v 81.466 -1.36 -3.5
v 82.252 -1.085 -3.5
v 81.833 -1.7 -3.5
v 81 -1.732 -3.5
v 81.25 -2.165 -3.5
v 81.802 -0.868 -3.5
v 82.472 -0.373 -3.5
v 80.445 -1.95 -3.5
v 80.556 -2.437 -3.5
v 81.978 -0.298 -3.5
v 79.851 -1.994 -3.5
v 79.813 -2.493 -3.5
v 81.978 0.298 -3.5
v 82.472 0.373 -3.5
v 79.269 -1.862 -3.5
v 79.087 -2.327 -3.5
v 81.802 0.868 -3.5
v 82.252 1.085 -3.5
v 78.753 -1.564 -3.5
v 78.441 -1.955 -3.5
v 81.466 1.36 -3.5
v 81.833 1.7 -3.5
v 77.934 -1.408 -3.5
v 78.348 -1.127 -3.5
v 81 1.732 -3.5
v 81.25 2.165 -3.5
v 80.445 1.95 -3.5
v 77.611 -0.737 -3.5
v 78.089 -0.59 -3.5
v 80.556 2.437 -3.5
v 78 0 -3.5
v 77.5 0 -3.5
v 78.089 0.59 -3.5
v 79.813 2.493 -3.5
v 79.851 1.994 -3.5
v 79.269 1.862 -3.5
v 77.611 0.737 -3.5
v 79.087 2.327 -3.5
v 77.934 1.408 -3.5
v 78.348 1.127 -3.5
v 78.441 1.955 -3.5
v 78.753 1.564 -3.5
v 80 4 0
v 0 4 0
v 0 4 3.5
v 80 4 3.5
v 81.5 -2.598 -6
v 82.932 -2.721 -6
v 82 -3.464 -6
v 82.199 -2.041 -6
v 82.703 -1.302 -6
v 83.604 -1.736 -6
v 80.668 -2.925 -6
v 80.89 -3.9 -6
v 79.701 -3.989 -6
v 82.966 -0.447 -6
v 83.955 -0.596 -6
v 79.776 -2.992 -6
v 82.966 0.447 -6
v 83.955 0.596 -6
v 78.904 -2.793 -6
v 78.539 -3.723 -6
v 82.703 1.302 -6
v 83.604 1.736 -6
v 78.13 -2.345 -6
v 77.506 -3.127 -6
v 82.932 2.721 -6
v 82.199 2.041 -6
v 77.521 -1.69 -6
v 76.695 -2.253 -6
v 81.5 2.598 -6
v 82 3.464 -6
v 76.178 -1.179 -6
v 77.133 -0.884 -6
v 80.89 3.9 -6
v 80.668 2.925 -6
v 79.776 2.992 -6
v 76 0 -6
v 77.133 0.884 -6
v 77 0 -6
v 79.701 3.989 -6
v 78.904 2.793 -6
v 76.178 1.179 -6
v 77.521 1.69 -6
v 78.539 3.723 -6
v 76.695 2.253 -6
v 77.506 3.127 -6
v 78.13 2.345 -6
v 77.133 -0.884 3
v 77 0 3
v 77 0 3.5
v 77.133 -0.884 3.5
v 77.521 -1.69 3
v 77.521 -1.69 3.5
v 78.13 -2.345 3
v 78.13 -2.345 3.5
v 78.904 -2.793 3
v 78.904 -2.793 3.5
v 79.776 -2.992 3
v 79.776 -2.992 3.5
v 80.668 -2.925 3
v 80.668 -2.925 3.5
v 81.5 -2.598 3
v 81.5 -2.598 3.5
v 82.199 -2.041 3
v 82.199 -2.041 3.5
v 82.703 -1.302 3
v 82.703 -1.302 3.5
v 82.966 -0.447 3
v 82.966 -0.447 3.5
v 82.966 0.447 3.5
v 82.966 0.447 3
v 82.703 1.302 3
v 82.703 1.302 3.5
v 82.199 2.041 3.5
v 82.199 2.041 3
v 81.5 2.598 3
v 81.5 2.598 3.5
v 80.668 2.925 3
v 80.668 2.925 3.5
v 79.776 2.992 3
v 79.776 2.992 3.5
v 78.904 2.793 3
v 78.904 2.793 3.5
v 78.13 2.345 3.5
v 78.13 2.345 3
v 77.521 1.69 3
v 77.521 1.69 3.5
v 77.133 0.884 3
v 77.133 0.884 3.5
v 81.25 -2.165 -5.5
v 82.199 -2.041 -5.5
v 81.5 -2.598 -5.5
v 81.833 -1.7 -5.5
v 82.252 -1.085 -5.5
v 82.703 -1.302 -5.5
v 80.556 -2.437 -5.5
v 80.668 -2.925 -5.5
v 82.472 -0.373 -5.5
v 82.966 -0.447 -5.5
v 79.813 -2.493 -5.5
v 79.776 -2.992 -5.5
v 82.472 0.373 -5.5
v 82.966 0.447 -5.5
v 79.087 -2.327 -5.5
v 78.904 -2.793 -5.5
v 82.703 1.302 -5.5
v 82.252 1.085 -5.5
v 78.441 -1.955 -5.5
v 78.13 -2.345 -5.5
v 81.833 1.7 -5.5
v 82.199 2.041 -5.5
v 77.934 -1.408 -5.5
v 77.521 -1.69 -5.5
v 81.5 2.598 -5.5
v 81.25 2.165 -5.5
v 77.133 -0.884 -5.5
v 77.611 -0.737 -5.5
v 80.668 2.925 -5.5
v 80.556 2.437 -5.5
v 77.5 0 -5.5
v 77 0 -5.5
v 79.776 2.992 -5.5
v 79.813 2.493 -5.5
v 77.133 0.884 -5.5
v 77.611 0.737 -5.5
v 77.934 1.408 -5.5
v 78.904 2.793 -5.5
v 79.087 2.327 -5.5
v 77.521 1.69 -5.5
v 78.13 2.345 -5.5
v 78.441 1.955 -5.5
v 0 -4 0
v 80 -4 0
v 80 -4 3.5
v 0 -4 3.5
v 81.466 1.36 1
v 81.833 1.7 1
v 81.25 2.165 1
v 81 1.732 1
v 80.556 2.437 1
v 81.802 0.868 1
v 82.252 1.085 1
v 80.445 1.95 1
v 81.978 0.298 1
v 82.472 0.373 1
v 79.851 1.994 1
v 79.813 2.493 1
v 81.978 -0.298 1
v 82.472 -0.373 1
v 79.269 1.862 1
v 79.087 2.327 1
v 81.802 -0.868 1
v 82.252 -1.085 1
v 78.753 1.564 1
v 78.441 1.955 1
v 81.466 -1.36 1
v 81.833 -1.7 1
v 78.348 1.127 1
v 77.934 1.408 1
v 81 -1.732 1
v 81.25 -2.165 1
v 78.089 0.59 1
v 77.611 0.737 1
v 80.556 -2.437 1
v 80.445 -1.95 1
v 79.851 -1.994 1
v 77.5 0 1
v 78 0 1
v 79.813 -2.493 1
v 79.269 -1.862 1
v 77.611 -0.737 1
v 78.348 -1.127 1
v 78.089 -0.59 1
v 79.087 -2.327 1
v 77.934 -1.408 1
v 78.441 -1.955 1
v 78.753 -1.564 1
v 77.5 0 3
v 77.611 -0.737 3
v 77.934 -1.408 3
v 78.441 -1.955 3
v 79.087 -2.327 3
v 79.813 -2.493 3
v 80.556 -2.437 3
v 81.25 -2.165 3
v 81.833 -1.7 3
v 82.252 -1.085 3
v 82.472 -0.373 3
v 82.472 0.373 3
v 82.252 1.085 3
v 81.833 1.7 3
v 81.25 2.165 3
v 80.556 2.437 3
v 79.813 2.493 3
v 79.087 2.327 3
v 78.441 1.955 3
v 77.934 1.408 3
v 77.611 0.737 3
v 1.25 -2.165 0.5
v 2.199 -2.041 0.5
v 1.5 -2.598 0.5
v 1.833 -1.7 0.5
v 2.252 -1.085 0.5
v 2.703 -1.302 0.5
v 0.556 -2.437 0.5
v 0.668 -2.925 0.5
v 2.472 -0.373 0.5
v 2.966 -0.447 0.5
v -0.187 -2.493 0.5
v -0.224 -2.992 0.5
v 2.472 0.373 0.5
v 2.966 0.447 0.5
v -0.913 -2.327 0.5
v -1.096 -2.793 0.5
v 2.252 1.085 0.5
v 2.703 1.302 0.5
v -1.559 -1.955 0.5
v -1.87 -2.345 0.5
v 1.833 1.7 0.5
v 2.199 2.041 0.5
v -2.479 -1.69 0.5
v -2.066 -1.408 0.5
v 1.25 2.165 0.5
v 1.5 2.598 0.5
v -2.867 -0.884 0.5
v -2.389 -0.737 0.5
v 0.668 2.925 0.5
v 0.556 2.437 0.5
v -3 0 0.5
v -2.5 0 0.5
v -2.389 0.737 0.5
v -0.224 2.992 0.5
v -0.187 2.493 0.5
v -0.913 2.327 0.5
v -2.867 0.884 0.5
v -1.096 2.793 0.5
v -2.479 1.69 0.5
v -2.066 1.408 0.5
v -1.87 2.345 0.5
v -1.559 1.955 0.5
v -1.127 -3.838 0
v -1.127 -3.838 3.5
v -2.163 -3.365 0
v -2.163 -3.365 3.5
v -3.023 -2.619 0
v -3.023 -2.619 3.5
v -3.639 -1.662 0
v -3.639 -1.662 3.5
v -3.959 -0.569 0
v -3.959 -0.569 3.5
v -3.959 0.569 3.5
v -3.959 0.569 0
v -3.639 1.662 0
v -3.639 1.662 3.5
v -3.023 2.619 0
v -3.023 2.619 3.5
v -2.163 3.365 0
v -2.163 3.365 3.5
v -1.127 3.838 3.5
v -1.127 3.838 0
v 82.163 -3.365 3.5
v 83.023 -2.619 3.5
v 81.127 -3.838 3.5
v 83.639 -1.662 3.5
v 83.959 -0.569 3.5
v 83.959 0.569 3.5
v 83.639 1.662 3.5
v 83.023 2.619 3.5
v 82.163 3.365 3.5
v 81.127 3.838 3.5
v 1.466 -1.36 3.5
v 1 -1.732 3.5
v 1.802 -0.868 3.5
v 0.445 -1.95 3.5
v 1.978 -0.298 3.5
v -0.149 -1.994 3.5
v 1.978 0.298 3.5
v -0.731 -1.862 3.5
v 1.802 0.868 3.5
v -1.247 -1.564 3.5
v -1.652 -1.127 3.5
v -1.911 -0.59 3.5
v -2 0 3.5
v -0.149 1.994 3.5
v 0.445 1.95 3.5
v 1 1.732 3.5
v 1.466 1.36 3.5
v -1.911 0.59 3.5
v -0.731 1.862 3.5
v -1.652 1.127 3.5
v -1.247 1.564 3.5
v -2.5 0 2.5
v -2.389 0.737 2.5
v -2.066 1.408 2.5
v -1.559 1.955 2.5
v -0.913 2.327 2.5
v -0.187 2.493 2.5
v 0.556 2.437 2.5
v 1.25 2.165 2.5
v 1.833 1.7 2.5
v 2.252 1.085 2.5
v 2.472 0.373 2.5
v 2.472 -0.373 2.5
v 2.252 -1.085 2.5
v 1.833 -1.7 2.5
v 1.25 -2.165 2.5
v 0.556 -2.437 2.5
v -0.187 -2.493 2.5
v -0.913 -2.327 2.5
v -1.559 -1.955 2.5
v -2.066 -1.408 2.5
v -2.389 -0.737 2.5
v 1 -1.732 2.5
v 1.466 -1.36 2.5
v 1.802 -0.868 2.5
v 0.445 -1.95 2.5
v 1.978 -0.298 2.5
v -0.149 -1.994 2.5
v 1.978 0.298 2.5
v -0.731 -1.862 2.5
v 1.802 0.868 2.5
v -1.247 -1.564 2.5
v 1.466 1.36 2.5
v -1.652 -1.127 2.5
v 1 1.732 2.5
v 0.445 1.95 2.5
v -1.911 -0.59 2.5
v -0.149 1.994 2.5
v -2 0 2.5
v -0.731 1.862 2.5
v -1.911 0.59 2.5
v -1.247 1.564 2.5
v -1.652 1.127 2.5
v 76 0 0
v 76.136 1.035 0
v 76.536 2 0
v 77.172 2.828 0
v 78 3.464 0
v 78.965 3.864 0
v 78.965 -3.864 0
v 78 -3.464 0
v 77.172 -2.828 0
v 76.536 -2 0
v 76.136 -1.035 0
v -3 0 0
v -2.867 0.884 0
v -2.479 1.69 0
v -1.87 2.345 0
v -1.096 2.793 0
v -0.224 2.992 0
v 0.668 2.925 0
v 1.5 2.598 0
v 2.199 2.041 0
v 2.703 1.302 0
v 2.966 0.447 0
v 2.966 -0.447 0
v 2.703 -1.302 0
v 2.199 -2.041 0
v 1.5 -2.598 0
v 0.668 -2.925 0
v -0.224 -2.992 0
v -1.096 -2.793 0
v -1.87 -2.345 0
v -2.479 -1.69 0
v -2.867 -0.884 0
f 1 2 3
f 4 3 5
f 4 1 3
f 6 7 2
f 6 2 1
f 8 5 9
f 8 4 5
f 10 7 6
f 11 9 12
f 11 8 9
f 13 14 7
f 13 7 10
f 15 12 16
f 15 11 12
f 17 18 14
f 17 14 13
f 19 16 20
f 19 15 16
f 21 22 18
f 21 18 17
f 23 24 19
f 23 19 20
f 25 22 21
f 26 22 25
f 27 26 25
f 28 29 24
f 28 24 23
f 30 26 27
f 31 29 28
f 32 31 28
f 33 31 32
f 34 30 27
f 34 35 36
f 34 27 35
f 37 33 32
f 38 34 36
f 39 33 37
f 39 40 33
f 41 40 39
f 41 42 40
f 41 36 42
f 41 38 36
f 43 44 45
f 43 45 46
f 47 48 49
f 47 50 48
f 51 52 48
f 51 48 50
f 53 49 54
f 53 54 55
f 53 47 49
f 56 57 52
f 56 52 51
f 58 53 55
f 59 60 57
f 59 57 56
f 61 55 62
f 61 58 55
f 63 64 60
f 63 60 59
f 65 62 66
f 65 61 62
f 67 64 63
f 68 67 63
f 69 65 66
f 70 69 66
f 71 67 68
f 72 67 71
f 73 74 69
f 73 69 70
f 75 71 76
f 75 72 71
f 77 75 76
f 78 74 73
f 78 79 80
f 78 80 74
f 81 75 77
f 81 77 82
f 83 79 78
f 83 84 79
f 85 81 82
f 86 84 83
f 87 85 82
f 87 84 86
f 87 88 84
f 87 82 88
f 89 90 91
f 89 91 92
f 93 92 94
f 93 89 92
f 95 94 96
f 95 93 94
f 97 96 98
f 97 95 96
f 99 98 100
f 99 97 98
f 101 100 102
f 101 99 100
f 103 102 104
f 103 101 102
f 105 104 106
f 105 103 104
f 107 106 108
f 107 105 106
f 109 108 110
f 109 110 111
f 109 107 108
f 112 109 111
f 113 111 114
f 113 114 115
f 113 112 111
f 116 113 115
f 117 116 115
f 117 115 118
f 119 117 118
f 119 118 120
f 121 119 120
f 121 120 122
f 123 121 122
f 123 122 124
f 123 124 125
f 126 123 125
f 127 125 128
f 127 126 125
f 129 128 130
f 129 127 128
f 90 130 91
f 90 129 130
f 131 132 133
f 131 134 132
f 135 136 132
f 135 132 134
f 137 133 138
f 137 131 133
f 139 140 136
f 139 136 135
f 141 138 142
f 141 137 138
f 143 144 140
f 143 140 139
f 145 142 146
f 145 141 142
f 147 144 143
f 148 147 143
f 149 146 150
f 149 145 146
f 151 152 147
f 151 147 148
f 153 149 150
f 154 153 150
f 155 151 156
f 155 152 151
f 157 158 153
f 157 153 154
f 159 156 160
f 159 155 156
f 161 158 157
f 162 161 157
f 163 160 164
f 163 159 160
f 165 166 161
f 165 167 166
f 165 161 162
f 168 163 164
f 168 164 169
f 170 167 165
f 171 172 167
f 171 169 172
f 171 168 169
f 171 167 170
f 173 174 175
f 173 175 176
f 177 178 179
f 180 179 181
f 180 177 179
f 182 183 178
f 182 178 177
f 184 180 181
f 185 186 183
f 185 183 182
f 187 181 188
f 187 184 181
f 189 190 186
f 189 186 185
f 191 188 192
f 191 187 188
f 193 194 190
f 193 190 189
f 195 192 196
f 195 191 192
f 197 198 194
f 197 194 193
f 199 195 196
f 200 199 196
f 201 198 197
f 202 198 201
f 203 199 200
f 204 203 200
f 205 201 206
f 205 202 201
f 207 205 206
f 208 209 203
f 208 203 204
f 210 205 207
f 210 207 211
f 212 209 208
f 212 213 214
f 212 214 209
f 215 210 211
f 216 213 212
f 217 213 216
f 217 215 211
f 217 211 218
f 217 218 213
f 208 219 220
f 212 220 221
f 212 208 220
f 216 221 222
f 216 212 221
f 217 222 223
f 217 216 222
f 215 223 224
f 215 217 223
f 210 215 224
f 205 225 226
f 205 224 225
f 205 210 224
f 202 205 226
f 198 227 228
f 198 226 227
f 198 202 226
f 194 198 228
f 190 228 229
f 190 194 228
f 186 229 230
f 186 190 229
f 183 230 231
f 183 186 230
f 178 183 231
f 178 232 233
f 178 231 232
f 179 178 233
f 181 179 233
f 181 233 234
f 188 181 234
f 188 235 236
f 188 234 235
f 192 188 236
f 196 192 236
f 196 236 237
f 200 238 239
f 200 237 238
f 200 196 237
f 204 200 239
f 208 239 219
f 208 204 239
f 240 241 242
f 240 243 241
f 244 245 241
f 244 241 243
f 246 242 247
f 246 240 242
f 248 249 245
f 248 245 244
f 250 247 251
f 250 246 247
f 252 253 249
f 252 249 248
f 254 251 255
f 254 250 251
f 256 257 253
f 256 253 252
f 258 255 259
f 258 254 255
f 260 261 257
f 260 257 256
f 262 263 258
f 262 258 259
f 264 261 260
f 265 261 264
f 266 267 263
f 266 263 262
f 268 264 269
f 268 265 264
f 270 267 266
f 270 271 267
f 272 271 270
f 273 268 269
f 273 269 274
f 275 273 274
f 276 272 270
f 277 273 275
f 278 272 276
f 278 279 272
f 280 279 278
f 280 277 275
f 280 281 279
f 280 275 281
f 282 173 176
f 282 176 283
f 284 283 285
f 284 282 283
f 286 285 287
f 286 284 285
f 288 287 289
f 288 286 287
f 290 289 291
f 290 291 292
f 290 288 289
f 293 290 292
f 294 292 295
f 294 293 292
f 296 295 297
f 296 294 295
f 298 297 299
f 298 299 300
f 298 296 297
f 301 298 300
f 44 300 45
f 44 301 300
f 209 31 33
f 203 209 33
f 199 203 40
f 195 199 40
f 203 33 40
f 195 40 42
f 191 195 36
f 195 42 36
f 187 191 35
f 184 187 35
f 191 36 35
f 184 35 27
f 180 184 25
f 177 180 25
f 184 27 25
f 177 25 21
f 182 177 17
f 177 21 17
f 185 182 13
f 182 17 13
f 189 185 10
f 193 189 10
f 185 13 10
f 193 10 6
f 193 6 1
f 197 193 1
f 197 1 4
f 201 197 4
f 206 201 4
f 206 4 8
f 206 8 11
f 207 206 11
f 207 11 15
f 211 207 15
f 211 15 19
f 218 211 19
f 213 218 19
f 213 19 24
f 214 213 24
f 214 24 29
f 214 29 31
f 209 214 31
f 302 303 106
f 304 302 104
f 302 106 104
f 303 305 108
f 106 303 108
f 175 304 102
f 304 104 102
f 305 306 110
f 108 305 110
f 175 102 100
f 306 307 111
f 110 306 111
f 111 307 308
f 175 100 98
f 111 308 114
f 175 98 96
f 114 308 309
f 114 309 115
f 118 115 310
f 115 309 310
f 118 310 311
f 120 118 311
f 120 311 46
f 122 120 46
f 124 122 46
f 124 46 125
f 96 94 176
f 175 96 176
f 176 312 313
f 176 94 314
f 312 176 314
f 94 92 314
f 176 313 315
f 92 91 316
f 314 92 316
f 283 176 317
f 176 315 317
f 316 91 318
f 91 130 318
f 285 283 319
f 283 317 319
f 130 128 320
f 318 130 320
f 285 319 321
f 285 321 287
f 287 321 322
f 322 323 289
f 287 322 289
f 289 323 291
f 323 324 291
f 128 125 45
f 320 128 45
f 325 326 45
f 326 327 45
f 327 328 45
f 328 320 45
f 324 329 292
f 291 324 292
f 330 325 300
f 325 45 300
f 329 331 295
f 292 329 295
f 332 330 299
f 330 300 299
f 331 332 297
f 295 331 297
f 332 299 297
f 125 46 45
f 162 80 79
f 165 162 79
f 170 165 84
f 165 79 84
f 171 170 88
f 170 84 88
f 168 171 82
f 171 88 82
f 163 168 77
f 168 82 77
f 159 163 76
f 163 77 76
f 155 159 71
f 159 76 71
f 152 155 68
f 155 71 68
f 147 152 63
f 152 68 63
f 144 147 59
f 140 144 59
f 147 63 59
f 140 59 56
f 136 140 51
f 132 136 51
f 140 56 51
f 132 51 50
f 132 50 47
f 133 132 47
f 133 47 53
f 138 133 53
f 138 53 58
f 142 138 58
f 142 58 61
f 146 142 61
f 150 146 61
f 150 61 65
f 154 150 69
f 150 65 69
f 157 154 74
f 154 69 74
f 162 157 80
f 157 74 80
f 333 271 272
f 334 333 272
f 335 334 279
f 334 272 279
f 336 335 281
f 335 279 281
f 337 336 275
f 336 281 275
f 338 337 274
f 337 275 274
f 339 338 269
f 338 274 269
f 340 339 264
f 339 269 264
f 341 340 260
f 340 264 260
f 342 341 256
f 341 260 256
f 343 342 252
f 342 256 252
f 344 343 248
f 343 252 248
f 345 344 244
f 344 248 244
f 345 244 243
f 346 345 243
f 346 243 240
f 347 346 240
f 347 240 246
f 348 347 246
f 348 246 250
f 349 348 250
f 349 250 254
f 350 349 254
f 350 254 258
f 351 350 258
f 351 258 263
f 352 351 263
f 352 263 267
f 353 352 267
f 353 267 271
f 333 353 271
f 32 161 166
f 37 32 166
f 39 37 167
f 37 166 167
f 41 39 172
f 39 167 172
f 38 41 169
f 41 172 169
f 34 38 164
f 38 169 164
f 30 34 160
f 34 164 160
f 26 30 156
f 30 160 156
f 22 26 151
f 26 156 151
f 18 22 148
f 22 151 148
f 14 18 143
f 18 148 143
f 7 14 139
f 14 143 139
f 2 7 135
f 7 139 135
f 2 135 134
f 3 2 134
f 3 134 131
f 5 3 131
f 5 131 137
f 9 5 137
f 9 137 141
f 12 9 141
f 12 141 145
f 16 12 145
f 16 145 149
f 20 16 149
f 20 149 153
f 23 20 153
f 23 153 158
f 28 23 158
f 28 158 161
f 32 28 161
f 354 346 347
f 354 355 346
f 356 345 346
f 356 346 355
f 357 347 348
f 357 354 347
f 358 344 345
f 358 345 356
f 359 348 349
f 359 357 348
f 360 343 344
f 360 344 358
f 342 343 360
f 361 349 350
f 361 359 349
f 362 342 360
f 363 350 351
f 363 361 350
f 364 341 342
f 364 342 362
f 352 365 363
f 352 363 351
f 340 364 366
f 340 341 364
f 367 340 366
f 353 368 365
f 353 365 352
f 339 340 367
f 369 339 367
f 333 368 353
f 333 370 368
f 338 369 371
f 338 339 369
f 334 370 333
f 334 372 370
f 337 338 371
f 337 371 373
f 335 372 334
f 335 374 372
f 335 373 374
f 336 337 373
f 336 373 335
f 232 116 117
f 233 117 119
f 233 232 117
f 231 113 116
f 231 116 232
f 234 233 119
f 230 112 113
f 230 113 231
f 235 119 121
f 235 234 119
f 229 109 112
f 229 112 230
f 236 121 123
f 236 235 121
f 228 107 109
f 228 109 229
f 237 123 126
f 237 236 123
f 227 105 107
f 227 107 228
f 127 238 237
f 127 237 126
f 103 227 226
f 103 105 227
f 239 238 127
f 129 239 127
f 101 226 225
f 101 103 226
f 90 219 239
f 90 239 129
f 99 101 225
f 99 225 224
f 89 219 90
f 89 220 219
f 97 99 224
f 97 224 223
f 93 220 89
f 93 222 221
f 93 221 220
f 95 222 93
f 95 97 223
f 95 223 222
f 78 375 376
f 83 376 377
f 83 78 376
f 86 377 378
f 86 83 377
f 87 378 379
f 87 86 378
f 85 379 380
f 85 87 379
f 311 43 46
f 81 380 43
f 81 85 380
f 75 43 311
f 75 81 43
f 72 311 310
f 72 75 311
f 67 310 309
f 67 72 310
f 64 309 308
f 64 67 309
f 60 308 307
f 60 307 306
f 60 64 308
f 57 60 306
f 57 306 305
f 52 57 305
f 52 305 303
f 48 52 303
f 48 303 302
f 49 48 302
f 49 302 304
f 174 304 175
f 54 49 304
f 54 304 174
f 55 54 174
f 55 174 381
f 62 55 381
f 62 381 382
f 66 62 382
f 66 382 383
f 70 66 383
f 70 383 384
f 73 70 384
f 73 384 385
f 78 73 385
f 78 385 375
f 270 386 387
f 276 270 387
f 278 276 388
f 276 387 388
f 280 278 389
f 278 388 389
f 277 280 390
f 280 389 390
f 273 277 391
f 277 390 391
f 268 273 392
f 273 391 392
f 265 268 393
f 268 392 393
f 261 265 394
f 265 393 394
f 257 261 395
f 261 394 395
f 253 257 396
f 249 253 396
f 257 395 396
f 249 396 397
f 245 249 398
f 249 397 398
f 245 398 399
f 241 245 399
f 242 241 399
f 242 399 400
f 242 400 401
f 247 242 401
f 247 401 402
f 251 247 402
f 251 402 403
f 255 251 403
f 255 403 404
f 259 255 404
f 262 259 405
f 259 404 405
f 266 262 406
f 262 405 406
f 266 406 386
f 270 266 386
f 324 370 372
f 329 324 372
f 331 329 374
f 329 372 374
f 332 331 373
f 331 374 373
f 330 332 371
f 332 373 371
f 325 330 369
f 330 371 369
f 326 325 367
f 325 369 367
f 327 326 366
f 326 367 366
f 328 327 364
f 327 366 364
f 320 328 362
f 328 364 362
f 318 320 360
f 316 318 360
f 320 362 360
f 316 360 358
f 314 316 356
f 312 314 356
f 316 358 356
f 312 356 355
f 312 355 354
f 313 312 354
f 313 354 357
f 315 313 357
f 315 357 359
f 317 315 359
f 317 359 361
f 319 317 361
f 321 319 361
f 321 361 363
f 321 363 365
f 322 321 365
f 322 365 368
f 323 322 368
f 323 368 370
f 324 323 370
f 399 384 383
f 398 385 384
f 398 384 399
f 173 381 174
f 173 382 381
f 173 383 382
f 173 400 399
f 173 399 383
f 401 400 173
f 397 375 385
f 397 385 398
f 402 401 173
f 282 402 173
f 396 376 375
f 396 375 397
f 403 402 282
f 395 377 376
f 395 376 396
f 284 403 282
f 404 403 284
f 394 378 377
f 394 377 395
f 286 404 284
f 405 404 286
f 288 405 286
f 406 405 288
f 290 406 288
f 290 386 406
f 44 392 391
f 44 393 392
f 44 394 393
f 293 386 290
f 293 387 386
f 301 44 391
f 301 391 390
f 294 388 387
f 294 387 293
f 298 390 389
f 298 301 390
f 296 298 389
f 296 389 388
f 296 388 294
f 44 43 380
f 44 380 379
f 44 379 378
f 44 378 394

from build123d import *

# Parameters (mm, degrees)
EXTRUDE_1_DEPTH     = 3.5
SKETCH_4_R          = 2
CUT_EXTRUDE_1_DEPTH = 85.167986788
SKETCH_4_3_R        = 2.5
SKETCH_4_3_R_2      = 2
CUT_EXTRUDE_2_DEPTH = 2.5
SKETCH_4_5_R        = 3
SKETCH_4_5_R_2      = 2.5
CUT_EXTRUDE_4_DEPTH = 0.5
EXTRUDE_START       = 6
SKETCH_5_R          = 4
EXTRUDE_2_DEPTH     = 6
SKETCH_6_R          = 2
CUT_EXTRUDE_5_DEPTH = 85.630077396
SKETCH_6_3_R        = 2.5
SKETCH_6_3_R_2      = 2
CUT_EXTRUDE_6_DEPTH = 2.5
SKETCH_6_4_R        = 3
SKETCH_6_4_R_2      = 2.5
CUT_EXTRUDE_7_DEPTH = 0.5
CUT_EXTRUDE_START   = -2.5
SKETCH_7_R          = 2.5
CUT_EXTRUDE_8_DEPTH = 2.5
CUT_EXTRUDE_START_2 = -0.5
SKETCH_7_3_R        = 3
SKETCH_7_3_R_2      = 2.5
CUT_EXTRUDE_9_DEPTH = 0.5


with BuildPart() as part:
    # 草图3 → 凸台-拉伸1 (new body)
    with BuildSketch(Plane.XY):
        with BuildLine():
            Line((0, 4), (80, 4))
            ThreePointArc((80, 4), (84, 0), (80, -4))
            Line((80, -4), (0, -4))
            ThreePointArc((0, -4), (-4, 0), (0, 4))
        make_face()
    extrude(amount=EXTRUDE_1_DEPTH)

    # 草图4 → 切除-拉伸1 (cut, through all)
    with BuildSketch(Plane(origin=(0, 0, 0), x_dir=(-1, 0, 0), z_dir=(0, 0, -1))):
        Circle(SKETCH_4_R)
    extrude(amount=-CUT_EXTRUDE_1_DEPTH, mode=Mode.SUBTRACT)

    # 草图4<3> → 切除-拉伸2 (cut)
    with BuildSketch(Plane(origin=(0, 0, 0), x_dir=(-1, 0, 0), z_dir=(0, 0, -1))):
        Circle(SKETCH_4_3_R)
        Circle(SKETCH_4_3_R_2, mode=Mode.SUBTRACT)
    extrude(amount=-CUT_EXTRUDE_2_DEPTH, mode=Mode.SUBTRACT)

    # 草图4<5> → 切除-拉伸4 (cut)
    with BuildSketch(Plane(origin=(0, 0, 0), x_dir=(-1, 0, 0), z_dir=(0, 0, -1))):
        Circle(SKETCH_4_5_R)
        Circle(SKETCH_4_5_R_2, mode=Mode.SUBTRACT)
    extrude(amount=-CUT_EXTRUDE_4_DEPTH, mode=Mode.SUBTRACT)

    # 草图5 → 凸台-拉伸2 (add)
    with BuildSketch(Plane(origin=(0, 0, 0), x_dir=(-1, 0, 0), z_dir=(0, 0, -1)).offset(EXTRUDE_START)):
        with Locations((-80, 0)):
            Circle(SKETCH_5_R)
    extrude(amount=-EXTRUDE_2_DEPTH)

    # 草图6 → 切除-拉伸5 (cut, through all)
    with BuildSketch(Plane(origin=(0, 0, -6), x_dir=(-1, 0, 0), z_dir=(0, 0, -1))):
        with Locations((-80, 0)):
            Circle(SKETCH_6_R)
    extrude(amount=-CUT_EXTRUDE_5_DEPTH, mode=Mode.SUBTRACT)

    # 草图6<3> → 切除-拉伸6 (cut)
    with BuildSketch(Plane(origin=(0, 0, -6), x_dir=(-1, 0, 0), z_dir=(0, 0, -1))):
        with Locations((-80, 0)):
            Circle(SKETCH_6_3_R)
        with Locations((-80, 0)):
            Circle(SKETCH_6_3_R_2, mode=Mode.SUBTRACT)
    extrude(amount=-CUT_EXTRUDE_6_DEPTH, mode=Mode.SUBTRACT)

    # 草图6<4> → 切除-拉伸7 (cut)
    with BuildSketch(Plane(origin=(0, 0, -6), x_dir=(-1, 0, 0), z_dir=(0, 0, -1))):
        with Locations((-80, 0)):
            Circle(SKETCH_6_4_R)
        with Locations((-80, 0)):
            Circle(SKETCH_6_4_R_2, mode=Mode.SUBTRACT)
    extrude(amount=-CUT_EXTRUDE_7_DEPTH, mode=Mode.SUBTRACT)

    # 草图7 → 切除-拉伸8 (cut)
    with BuildSketch(Plane.XY.offset(3.5).offset(CUT_EXTRUDE_START)):
        with Locations((80, 0)):
            Circle(SKETCH_7_R)
    extrude(amount=CUT_EXTRUDE_8_DEPTH, mode=Mode.SUBTRACT)

    # 草图7<3> → 切除-拉伸9 (cut)
    with BuildSketch(Plane.XY.offset(3.5).offset(CUT_EXTRUDE_START_2)):
        with Locations((80, 0)):
            Circle(SKETCH_7_3_R)
        with Locations((80, 0)):
            Circle(SKETCH_7_3_R_2, mode=Mode.SUBTRACT)
    extrude(amount=CUT_EXTRUDE_9_DEPTH, mode=Mode.SUBTRACT)


solid = part.part
